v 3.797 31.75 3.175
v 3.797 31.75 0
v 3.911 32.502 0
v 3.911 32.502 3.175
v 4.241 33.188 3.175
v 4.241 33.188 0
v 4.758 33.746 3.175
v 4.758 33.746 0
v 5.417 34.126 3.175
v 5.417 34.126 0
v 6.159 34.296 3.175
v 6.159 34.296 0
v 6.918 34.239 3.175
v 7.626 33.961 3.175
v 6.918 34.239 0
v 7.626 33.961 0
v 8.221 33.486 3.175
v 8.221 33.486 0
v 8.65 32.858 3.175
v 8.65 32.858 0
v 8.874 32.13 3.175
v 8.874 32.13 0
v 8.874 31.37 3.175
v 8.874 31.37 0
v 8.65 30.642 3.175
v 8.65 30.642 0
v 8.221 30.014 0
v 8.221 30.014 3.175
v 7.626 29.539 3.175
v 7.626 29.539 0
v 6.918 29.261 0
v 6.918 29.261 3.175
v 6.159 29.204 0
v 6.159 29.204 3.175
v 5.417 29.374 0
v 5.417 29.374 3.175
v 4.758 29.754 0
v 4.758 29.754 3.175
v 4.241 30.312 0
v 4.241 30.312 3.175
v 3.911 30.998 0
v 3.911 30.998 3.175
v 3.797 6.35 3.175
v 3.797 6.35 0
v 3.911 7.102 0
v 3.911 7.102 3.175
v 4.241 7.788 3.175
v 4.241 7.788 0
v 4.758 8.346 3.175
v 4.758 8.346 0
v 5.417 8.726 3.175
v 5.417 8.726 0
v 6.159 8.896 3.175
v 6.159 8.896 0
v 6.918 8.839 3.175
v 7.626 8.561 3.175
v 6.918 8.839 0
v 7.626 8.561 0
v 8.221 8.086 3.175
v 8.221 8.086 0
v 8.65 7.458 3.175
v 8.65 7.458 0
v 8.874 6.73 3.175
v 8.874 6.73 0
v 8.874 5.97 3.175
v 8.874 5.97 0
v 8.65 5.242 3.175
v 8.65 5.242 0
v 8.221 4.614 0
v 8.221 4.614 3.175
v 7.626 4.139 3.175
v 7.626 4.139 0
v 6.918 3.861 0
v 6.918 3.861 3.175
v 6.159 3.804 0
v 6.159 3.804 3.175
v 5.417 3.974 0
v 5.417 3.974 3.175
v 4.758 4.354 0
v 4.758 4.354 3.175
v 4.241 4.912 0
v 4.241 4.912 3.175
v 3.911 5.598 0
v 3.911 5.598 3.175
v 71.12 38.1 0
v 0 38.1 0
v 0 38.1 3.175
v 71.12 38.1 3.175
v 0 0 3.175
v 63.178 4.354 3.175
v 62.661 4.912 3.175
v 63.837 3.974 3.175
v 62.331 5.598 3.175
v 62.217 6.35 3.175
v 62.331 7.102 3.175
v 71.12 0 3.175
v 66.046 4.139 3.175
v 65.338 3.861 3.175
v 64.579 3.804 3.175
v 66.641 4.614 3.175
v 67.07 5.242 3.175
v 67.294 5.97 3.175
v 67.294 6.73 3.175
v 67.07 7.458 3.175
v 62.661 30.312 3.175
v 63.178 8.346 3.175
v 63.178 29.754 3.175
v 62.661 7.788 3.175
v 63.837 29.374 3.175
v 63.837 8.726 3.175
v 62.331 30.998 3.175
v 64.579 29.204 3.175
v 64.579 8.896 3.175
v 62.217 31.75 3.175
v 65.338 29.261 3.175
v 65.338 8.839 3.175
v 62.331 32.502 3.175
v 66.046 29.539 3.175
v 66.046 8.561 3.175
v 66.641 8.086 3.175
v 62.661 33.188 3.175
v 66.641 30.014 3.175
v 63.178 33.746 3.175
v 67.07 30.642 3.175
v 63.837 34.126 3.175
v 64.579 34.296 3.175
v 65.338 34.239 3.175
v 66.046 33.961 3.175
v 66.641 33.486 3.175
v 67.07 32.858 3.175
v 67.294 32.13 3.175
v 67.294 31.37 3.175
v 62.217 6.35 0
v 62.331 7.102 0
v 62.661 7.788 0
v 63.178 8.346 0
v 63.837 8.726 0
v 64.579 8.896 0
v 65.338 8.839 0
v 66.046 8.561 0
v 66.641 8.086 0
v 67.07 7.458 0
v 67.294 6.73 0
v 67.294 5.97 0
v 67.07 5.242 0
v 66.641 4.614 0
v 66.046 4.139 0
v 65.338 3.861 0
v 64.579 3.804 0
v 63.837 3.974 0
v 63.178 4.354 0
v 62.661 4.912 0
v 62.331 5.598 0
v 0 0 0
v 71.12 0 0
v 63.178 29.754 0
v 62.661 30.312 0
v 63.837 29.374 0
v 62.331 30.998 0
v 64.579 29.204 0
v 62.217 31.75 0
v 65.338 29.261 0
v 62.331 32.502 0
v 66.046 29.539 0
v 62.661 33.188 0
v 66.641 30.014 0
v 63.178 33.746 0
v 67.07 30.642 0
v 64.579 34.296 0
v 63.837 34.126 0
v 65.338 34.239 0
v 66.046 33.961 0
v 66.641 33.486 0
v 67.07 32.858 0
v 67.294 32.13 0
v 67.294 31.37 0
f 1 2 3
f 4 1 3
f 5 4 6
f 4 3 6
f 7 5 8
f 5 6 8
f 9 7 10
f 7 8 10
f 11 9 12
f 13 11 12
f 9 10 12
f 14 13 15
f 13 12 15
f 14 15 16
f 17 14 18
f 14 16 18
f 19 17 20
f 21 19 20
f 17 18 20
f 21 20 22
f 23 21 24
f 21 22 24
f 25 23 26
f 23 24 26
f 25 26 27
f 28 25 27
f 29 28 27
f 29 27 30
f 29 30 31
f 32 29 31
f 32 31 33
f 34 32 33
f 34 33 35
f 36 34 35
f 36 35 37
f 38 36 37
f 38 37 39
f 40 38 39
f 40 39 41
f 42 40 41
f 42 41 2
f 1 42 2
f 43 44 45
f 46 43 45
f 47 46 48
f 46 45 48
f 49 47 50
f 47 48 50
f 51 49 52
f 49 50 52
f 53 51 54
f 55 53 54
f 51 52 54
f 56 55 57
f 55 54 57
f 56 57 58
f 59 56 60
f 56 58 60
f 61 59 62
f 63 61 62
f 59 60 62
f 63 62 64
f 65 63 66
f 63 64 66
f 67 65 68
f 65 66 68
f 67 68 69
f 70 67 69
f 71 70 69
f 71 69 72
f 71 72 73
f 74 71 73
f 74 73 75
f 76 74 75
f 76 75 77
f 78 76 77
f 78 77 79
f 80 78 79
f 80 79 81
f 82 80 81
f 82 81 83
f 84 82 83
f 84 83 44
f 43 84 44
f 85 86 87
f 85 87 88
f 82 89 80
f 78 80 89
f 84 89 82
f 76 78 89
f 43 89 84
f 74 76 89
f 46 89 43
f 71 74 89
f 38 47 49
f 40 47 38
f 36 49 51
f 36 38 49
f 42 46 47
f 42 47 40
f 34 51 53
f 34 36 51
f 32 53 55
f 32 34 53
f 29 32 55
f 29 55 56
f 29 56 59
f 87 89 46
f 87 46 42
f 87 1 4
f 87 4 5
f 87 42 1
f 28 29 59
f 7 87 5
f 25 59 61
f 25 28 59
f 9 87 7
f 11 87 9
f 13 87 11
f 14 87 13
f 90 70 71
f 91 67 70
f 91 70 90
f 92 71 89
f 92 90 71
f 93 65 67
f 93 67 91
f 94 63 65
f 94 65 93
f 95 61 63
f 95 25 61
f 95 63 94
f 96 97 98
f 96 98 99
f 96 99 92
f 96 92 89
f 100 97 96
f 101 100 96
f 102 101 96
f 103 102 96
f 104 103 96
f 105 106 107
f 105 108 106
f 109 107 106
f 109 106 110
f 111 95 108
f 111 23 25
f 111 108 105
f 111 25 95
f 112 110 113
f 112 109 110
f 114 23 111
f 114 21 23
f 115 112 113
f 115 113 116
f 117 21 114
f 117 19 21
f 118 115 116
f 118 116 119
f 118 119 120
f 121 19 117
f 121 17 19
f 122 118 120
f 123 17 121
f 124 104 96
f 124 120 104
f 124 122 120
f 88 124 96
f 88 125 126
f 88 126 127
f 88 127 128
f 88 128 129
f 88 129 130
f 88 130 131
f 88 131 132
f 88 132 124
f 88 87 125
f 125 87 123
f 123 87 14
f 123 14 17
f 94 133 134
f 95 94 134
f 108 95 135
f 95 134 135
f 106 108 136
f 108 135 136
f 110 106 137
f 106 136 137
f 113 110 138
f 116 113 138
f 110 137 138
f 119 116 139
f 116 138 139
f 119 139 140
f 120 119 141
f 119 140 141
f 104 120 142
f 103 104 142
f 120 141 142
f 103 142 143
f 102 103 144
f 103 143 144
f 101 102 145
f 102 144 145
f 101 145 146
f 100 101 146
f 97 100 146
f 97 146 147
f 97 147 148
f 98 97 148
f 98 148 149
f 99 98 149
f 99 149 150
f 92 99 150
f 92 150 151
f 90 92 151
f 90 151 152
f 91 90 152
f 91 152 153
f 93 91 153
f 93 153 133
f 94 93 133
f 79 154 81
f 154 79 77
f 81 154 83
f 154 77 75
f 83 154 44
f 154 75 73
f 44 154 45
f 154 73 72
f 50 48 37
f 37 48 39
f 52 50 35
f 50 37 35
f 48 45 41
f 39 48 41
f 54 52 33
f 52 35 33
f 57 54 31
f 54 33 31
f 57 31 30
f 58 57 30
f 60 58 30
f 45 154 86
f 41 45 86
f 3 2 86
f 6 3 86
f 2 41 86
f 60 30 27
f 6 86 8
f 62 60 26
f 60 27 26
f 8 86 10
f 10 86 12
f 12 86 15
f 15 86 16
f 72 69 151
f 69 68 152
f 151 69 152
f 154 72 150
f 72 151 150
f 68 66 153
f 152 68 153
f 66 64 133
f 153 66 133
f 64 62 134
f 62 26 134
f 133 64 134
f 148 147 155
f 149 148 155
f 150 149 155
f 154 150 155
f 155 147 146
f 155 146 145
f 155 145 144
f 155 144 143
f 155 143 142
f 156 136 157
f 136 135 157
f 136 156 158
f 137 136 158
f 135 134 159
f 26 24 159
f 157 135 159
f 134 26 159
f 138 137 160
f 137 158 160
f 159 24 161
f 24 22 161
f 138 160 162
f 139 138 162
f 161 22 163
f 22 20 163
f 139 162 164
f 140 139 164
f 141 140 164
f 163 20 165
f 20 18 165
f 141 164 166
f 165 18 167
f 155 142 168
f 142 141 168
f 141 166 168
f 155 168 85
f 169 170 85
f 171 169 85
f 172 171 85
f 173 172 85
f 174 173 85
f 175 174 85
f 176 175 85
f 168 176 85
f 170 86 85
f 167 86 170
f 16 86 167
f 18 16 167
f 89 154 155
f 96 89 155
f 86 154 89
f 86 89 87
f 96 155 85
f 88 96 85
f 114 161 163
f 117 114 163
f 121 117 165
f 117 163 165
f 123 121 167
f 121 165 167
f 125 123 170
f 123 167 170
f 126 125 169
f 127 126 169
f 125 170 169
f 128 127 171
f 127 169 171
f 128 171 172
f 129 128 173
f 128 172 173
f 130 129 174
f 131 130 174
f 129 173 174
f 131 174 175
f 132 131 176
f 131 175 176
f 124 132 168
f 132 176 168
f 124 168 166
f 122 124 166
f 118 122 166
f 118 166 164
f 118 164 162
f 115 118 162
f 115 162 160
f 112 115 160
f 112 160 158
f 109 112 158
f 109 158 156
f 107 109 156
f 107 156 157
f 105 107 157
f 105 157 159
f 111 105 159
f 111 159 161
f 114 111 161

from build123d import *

# Parameters (mm, degrees)
SKETCH1_W           = 71.12
SKETCH1_H           = 38.1
BOSS_EXTRUDE1_DEPTH = 3.175
CUT_EXTRUDE1_REACH  = 5.175
SKETCH2_R           = 2.5527


with BuildPart() as part:
    # Sketch1 → Boss-Extrude1 (new body)
    with BuildSketch(Plane.XY):
        with Locations((35.56, 19.05)):
            Rectangle(SKETCH1_W, SKETCH1_H)
    extrude(amount=BOSS_EXTRUDE1_DEPTH)

    # Sketch2 → Cut-Extrude1 (cut, up to next)
    with BuildSketch(Plane(origin=(0, 0, 0), x_dir=(-1, 0, 0), z_dir=(0, 0, -1)), mode=Mode.PRIVATE) as cut_extrude1_sk1:
        with Locations((-6.35, 6.35)):
            Circle(SKETCH2_R)
    cut_extrude1_tool1 = extrude(cut_extrude1_sk1.sketch, amount=-CUT_EXTRUDE1_REACH, mode=Mode.PRIVATE) & part.part
    add(cut_extrude1_tool1.solids().sort_by_distance((6.35, 6.35, 0))[0], mode=Mode.SUBTRACT)
    # Sketch2 → Cut-Extrude1 (cut, up to next)
    with BuildSketch(Plane(origin=(0, 0, 0), x_dir=(-1, 0, 0), z_dir=(0, 0, -1)), mode=Mode.PRIVATE) as cut_extrude1_sk2:
        with Locations((-64.77, 6.35)):
            Circle(SKETCH2_R)
    cut_extrude1_tool2 = extrude(cut_extrude1_sk2.sketch, amount=-CUT_EXTRUDE1_REACH, mode=Mode.PRIVATE) & part.part
    add(cut_extrude1_tool2.solids().sort_by_distance((64.77, 6.35, 0))[0], mode=Mode.SUBTRACT)
    # Sketch2 → Cut-Extrude1 (cut, up to next)
    with BuildSketch(Plane(origin=(0, 0, 0), x_dir=(-1, 0, 0), z_dir=(0, 0, -1)), mode=Mode.PRIVATE) as cut_extrude1_sk3:
        with Locations((-64.77, 31.75)):
            Circle(SKETCH2_R)
    cut_extrude1_tool3 = extrude(cut_extrude1_sk3.sketch, amount=-CUT_EXTRUDE1_REACH, mode=Mode.PRIVATE) & part.part
    add(cut_extrude1_tool3.solids().sort_by_distance((64.77, 31.75, 0))[0], mode=Mode.SUBTRACT)
    # Sketch2 → Cut-Extrude1 (cut, up to next)
    with BuildSketch(Plane(origin=(0, 0, 0), x_dir=(-1, 0, 0), z_dir=(0, 0, -1)), mode=Mode.PRIVATE) as cut_extrude1_sk4:
        with Locations((-6.35, 31.75)):
            Circle(SKETCH2_R)
    cut_extrude1_tool4 = extrude(cut_extrude1_sk4.sketch, amount=-CUT_EXTRUDE1_REACH, mode=Mode.PRIVATE) & part.part
    add(cut_extrude1_tool4.solids().sort_by_distance((6.35, 31.75, 0))[0], mode=Mode.SUBTRACT)


solid = part.part
